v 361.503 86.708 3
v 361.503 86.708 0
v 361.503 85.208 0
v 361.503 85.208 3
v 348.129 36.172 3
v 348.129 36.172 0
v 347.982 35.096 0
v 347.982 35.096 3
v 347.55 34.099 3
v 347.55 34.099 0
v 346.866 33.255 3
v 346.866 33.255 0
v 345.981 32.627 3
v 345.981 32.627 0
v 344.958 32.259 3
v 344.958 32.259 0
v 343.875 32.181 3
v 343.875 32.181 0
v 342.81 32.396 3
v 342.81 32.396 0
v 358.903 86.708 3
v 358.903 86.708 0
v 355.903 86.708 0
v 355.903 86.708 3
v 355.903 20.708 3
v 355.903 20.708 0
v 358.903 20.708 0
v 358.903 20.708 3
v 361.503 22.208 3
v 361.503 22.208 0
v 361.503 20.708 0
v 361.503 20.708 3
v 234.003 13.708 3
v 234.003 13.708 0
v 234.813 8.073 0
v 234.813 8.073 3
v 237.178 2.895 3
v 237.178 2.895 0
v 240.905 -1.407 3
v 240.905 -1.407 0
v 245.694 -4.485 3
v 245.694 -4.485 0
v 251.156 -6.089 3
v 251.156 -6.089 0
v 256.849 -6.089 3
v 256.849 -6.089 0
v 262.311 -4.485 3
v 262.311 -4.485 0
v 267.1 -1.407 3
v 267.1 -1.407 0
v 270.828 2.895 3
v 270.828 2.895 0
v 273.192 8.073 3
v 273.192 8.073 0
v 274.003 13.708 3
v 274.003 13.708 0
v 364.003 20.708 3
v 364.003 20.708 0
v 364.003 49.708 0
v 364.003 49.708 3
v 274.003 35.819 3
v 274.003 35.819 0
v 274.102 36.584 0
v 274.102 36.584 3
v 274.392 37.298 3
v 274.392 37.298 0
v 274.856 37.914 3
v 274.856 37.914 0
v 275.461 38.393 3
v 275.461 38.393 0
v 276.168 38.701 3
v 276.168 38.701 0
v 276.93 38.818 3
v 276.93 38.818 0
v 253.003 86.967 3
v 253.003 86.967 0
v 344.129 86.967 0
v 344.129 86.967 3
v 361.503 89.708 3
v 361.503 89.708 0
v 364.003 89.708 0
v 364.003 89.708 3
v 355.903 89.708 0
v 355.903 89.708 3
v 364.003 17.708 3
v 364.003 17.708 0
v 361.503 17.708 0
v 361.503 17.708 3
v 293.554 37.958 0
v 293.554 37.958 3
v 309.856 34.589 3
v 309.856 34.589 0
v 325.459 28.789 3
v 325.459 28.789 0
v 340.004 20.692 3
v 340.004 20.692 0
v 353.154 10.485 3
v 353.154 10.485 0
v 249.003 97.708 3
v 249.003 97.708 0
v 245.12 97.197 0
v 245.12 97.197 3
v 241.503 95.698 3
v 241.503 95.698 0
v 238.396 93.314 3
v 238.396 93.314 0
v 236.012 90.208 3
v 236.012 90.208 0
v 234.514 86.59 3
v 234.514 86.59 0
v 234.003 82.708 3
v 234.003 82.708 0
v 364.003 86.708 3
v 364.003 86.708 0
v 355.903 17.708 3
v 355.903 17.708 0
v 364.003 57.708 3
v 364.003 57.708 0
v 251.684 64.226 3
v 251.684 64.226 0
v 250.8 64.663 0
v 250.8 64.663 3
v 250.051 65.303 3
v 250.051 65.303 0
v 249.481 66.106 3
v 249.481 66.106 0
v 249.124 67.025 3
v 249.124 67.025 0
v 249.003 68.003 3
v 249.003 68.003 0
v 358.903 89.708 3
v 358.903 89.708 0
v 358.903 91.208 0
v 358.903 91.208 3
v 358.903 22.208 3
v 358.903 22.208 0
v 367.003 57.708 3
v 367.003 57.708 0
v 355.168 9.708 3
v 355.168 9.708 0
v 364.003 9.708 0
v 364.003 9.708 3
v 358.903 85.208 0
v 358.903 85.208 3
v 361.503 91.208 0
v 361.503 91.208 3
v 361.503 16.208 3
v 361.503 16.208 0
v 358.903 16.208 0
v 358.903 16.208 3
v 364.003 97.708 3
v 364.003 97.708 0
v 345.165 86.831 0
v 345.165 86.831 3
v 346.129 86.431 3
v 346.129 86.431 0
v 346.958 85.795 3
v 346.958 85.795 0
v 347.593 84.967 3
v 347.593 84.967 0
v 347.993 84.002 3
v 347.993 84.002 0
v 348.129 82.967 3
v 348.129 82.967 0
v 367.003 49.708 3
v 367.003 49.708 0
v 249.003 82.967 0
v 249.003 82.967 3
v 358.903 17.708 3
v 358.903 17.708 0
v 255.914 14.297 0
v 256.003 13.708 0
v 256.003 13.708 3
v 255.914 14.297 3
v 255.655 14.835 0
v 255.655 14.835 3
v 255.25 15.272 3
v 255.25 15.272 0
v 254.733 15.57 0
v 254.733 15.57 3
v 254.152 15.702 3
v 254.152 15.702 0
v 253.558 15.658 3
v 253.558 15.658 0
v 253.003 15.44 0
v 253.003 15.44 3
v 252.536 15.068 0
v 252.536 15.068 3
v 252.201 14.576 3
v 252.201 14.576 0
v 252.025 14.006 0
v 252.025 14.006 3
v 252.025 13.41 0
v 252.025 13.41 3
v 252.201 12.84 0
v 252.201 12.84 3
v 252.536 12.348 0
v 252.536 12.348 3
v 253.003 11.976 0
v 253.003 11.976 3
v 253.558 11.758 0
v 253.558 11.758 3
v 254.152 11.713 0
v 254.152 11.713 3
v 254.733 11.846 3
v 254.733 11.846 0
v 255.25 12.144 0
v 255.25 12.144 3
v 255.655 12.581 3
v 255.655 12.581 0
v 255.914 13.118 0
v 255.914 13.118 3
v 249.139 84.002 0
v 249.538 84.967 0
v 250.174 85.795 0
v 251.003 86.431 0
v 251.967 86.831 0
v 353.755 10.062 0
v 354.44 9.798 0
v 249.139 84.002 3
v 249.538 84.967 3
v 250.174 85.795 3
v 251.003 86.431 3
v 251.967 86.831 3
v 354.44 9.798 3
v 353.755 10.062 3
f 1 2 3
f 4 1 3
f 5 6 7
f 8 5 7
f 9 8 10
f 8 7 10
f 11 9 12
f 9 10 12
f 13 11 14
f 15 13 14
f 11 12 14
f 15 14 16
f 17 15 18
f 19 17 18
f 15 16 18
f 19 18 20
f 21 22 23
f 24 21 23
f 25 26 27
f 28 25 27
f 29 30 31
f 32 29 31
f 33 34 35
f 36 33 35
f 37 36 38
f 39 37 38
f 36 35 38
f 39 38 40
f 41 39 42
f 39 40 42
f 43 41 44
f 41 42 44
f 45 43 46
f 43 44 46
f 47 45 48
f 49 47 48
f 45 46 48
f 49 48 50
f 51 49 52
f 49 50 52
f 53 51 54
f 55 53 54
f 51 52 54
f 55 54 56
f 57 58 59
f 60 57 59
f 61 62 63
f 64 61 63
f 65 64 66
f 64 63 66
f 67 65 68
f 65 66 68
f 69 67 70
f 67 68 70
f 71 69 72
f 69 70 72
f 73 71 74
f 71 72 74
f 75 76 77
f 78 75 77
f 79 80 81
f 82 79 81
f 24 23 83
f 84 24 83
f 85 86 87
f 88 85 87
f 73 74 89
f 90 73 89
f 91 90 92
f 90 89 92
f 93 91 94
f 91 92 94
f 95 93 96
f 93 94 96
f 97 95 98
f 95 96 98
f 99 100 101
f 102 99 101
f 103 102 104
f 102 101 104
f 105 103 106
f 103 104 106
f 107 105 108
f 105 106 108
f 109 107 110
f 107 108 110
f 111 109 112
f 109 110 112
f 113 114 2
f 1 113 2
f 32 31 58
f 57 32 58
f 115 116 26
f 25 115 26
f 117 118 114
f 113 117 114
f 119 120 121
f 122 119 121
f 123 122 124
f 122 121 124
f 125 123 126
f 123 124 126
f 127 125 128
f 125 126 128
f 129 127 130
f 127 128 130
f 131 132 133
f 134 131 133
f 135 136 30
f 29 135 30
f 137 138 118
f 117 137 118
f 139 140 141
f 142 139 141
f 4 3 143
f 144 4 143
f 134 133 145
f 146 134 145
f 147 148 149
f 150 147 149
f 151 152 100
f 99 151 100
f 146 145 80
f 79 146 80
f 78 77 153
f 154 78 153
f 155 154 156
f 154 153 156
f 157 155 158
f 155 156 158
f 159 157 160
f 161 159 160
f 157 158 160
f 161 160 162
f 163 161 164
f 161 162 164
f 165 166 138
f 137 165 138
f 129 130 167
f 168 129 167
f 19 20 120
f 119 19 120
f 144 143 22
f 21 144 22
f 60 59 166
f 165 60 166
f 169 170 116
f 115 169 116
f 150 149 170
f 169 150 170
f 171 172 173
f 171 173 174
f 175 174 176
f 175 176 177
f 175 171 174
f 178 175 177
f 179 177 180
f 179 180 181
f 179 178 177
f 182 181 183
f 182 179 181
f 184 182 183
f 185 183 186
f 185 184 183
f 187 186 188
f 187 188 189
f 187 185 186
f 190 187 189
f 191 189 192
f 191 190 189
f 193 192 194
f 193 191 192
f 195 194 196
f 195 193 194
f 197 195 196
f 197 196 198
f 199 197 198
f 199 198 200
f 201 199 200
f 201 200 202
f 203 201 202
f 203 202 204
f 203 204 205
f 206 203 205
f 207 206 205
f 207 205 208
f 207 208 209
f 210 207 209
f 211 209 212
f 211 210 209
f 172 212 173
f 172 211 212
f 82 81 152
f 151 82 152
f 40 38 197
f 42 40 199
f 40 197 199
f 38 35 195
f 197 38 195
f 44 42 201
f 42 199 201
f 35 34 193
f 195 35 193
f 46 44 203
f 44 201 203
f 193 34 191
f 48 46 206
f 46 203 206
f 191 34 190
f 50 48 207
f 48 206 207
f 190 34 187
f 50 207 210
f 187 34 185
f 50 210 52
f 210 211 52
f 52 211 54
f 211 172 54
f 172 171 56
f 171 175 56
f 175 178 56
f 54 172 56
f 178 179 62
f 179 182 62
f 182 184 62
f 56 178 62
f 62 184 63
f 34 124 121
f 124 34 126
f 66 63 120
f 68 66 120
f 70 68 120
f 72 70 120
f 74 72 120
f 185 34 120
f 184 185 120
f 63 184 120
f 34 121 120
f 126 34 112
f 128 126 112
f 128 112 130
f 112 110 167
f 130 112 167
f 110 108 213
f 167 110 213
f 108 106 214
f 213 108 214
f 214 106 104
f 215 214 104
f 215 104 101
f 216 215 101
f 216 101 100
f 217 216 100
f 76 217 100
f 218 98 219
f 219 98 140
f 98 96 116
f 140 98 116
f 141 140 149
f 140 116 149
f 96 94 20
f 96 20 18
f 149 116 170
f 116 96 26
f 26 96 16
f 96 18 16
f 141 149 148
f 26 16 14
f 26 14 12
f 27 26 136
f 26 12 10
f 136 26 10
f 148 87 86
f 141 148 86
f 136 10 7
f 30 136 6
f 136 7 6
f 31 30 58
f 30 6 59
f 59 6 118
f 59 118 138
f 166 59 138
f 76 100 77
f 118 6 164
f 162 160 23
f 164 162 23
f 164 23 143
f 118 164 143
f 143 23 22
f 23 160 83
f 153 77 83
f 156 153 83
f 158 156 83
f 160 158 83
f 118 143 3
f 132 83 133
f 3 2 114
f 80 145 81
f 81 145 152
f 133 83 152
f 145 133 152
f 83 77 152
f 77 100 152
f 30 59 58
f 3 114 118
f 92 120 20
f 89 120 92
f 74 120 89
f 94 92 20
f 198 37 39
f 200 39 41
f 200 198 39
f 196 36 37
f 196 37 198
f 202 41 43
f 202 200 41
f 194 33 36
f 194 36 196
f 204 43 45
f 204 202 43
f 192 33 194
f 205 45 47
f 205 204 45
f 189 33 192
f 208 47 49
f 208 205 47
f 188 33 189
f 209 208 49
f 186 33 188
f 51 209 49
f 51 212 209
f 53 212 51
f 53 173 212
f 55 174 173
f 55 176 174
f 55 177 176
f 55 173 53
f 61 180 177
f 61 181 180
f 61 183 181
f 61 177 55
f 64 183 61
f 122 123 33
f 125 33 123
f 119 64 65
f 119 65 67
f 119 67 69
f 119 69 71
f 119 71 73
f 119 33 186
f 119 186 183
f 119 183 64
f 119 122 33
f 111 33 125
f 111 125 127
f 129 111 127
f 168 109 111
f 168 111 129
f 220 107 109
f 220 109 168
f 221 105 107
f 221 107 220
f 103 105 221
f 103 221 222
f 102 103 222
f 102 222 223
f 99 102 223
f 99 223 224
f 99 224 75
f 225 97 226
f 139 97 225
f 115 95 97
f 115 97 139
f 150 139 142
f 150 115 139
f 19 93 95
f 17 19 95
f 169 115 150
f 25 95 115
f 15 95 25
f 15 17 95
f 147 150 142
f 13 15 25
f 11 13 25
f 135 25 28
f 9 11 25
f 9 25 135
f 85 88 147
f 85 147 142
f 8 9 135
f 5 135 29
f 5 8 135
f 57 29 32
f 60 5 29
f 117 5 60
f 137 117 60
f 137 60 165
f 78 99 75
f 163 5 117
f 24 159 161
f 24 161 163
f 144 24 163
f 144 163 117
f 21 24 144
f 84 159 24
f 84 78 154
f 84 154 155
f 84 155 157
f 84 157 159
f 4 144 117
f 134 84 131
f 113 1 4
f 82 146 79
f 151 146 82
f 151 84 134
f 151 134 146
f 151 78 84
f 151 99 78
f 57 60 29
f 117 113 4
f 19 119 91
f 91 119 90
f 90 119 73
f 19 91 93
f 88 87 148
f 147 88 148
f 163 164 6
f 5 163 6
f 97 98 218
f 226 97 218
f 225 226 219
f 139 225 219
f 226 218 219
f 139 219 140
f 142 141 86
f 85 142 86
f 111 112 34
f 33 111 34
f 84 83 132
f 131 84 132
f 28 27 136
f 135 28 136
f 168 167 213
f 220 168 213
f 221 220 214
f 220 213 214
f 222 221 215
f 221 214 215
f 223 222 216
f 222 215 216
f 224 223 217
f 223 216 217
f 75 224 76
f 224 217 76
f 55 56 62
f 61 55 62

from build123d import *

# Parameters (mm, degrees)
SKETCH_1_R      = 2
EXTRUDE_1_DEPTH = 3


with BuildPart() as part:
    # 草图1 → 凸台-拉伸1 (new body)
    with BuildSketch(Plane.XY):
        with BuildLine():
            Line((364.002581869, 97.707860978), (354.002581869, 97.707860978))
            Line((354.002581869, 97.707860978), (249.002581869, 97.707860978))
            ThreePointArc((249.002581869, 97.707860978), (238.395980151, 93.314462696), (234.002581869, 82.707860978))
            Line((234.002581869, 82.707860978), (234.002581869, 13.707860978))
            ThreePointArc((234.002581869, 13.707860978), (254.002581869, -6.292139022), (274.002581869, 13.707860978))
            Line((274.002581869, 13.707860978), (274.002581869, 35.819123465))
            ThreePointArc((274.002581869, 35.819123465), (274.855620398, 37.914488932), (276.929619495, 38.818236083))
            ThreePointArc((276.929619495, 38.818236083), (317.768023154, 31.985283132), (353.154233351, 10.484571811))
            ThreePointArc((353.154233351, 10.484571811), (354.089046944, 9.908765811), (355.16842929, 9.707860978))
            Line((355.16842929, 9.707860978), (364.002581869, 9.707860978))
            Line((364.002581869, 9.707860978), (364.002581869, 17.707860978))
            Line((364.002581869, 17.707860978), (361.502581869, 17.707860978))
            Line((361.502581869, 17.707860978), (361.502581869, 16.207860978))
            Line((361.502581869, 16.207860978), (358.902581869, 16.207860978))
            Line((358.902581869, 16.207860978), (358.902581869, 17.707860978))
            Line((358.902581869, 17.707860978), (355.902581869, 17.707860978))
            Line((355.902581869, 17.707860978), (355.902581869, 20.707860978))
            Line((355.902581869, 20.707860978), (358.902581869, 20.707860978))
            Line((358.902581869, 20.707860978), (358.902581869, 22.207860978))
            Line((358.902581869, 22.207860978), (361.502581869, 22.207860978))
            Line((361.502581869, 22.207860978), (361.502581869, 20.707860978))
            Line((361.502581869, 20.707860978), (364.002581869, 20.707860978))
            Line((364.002581869, 20.707860978), (364.002581869, 49.707860978))
            Line((364.002581869, 49.707860978), (367.002581869, 49.707860978))
            Line((367.002581869, 49.707860978), (367.002581869, 57.707860978))
            Line((367.002581869, 57.707860978), (364.002581869, 57.707860978))
            Line((364.002581869, 57.707860978), (364.002581869, 86.707860978))
            Line((364.002581869, 86.707860978), (361.502581869, 86.707860978))
            Line((361.502581869, 86.707860978), (361.502581869, 85.207860978))
            Line((361.502581869, 85.207860978), (358.902581869, 85.207860978))
            Line((358.902581869, 85.207860978), (358.902581869, 86.707860978))
            Line((358.902581869, 86.707860978), (355.902581869, 86.707860978))
            Line((355.902581869, 86.707860978), (355.902581869, 89.707860978))
            Line((355.902581869, 89.707860978), (358.902581869, 89.707860978))
            Line((358.902581869, 89.707860978), (358.902581869, 91.207860978))
            Line((358.902581869, 91.207860978), (361.502581869, 91.207860978))
            Line((361.502581869, 91.207860978), (361.502581869, 89.707860978))
            Line((361.502581869, 89.707860978), (364.002581869, 89.707860978))
            Line((364.002581869, 89.707860978), (364.002581869, 97.707860978))
        make_face()
        with Locations((254.002581869, 13.707860978)):
            Circle(SKETCH_1_R, mode=Mode.SUBTRACT)
        with BuildLine():
            Line((253.002581869, 86.967009497), (344.129272471, 86.967009497))
            ThreePointArc((344.129272471, 86.967009497), (346.957699596, 85.795436622), (348.129272471, 82.967009497))
            Line((348.129272471, 82.967009497), (348.129272471, 36.172406577))
            ThreePointArc((348.129272471, 36.172406577), (346.444858552, 32.910802508), (342.810241921, 32.396144085))
            Line((342.810241921, 32.396144085), (251.683551319, 64.226264226))
            ThreePointArc((251.683551319, 64.226264226), (249.740977801, 65.686940637), (249.002581869, 68.002526718))
            Line((249.002581869, 68.002526718), (249.002581869, 82.967009497))
            ThreePointArc((249.002581869, 82.967009497), (250.174154745, 85.795436622), (253.002581869, 86.967009497))
        make_face(mode=Mode.SUBTRACT)
    extrude(amount=EXTRUDE_1_DEPTH)


solid = part.part
